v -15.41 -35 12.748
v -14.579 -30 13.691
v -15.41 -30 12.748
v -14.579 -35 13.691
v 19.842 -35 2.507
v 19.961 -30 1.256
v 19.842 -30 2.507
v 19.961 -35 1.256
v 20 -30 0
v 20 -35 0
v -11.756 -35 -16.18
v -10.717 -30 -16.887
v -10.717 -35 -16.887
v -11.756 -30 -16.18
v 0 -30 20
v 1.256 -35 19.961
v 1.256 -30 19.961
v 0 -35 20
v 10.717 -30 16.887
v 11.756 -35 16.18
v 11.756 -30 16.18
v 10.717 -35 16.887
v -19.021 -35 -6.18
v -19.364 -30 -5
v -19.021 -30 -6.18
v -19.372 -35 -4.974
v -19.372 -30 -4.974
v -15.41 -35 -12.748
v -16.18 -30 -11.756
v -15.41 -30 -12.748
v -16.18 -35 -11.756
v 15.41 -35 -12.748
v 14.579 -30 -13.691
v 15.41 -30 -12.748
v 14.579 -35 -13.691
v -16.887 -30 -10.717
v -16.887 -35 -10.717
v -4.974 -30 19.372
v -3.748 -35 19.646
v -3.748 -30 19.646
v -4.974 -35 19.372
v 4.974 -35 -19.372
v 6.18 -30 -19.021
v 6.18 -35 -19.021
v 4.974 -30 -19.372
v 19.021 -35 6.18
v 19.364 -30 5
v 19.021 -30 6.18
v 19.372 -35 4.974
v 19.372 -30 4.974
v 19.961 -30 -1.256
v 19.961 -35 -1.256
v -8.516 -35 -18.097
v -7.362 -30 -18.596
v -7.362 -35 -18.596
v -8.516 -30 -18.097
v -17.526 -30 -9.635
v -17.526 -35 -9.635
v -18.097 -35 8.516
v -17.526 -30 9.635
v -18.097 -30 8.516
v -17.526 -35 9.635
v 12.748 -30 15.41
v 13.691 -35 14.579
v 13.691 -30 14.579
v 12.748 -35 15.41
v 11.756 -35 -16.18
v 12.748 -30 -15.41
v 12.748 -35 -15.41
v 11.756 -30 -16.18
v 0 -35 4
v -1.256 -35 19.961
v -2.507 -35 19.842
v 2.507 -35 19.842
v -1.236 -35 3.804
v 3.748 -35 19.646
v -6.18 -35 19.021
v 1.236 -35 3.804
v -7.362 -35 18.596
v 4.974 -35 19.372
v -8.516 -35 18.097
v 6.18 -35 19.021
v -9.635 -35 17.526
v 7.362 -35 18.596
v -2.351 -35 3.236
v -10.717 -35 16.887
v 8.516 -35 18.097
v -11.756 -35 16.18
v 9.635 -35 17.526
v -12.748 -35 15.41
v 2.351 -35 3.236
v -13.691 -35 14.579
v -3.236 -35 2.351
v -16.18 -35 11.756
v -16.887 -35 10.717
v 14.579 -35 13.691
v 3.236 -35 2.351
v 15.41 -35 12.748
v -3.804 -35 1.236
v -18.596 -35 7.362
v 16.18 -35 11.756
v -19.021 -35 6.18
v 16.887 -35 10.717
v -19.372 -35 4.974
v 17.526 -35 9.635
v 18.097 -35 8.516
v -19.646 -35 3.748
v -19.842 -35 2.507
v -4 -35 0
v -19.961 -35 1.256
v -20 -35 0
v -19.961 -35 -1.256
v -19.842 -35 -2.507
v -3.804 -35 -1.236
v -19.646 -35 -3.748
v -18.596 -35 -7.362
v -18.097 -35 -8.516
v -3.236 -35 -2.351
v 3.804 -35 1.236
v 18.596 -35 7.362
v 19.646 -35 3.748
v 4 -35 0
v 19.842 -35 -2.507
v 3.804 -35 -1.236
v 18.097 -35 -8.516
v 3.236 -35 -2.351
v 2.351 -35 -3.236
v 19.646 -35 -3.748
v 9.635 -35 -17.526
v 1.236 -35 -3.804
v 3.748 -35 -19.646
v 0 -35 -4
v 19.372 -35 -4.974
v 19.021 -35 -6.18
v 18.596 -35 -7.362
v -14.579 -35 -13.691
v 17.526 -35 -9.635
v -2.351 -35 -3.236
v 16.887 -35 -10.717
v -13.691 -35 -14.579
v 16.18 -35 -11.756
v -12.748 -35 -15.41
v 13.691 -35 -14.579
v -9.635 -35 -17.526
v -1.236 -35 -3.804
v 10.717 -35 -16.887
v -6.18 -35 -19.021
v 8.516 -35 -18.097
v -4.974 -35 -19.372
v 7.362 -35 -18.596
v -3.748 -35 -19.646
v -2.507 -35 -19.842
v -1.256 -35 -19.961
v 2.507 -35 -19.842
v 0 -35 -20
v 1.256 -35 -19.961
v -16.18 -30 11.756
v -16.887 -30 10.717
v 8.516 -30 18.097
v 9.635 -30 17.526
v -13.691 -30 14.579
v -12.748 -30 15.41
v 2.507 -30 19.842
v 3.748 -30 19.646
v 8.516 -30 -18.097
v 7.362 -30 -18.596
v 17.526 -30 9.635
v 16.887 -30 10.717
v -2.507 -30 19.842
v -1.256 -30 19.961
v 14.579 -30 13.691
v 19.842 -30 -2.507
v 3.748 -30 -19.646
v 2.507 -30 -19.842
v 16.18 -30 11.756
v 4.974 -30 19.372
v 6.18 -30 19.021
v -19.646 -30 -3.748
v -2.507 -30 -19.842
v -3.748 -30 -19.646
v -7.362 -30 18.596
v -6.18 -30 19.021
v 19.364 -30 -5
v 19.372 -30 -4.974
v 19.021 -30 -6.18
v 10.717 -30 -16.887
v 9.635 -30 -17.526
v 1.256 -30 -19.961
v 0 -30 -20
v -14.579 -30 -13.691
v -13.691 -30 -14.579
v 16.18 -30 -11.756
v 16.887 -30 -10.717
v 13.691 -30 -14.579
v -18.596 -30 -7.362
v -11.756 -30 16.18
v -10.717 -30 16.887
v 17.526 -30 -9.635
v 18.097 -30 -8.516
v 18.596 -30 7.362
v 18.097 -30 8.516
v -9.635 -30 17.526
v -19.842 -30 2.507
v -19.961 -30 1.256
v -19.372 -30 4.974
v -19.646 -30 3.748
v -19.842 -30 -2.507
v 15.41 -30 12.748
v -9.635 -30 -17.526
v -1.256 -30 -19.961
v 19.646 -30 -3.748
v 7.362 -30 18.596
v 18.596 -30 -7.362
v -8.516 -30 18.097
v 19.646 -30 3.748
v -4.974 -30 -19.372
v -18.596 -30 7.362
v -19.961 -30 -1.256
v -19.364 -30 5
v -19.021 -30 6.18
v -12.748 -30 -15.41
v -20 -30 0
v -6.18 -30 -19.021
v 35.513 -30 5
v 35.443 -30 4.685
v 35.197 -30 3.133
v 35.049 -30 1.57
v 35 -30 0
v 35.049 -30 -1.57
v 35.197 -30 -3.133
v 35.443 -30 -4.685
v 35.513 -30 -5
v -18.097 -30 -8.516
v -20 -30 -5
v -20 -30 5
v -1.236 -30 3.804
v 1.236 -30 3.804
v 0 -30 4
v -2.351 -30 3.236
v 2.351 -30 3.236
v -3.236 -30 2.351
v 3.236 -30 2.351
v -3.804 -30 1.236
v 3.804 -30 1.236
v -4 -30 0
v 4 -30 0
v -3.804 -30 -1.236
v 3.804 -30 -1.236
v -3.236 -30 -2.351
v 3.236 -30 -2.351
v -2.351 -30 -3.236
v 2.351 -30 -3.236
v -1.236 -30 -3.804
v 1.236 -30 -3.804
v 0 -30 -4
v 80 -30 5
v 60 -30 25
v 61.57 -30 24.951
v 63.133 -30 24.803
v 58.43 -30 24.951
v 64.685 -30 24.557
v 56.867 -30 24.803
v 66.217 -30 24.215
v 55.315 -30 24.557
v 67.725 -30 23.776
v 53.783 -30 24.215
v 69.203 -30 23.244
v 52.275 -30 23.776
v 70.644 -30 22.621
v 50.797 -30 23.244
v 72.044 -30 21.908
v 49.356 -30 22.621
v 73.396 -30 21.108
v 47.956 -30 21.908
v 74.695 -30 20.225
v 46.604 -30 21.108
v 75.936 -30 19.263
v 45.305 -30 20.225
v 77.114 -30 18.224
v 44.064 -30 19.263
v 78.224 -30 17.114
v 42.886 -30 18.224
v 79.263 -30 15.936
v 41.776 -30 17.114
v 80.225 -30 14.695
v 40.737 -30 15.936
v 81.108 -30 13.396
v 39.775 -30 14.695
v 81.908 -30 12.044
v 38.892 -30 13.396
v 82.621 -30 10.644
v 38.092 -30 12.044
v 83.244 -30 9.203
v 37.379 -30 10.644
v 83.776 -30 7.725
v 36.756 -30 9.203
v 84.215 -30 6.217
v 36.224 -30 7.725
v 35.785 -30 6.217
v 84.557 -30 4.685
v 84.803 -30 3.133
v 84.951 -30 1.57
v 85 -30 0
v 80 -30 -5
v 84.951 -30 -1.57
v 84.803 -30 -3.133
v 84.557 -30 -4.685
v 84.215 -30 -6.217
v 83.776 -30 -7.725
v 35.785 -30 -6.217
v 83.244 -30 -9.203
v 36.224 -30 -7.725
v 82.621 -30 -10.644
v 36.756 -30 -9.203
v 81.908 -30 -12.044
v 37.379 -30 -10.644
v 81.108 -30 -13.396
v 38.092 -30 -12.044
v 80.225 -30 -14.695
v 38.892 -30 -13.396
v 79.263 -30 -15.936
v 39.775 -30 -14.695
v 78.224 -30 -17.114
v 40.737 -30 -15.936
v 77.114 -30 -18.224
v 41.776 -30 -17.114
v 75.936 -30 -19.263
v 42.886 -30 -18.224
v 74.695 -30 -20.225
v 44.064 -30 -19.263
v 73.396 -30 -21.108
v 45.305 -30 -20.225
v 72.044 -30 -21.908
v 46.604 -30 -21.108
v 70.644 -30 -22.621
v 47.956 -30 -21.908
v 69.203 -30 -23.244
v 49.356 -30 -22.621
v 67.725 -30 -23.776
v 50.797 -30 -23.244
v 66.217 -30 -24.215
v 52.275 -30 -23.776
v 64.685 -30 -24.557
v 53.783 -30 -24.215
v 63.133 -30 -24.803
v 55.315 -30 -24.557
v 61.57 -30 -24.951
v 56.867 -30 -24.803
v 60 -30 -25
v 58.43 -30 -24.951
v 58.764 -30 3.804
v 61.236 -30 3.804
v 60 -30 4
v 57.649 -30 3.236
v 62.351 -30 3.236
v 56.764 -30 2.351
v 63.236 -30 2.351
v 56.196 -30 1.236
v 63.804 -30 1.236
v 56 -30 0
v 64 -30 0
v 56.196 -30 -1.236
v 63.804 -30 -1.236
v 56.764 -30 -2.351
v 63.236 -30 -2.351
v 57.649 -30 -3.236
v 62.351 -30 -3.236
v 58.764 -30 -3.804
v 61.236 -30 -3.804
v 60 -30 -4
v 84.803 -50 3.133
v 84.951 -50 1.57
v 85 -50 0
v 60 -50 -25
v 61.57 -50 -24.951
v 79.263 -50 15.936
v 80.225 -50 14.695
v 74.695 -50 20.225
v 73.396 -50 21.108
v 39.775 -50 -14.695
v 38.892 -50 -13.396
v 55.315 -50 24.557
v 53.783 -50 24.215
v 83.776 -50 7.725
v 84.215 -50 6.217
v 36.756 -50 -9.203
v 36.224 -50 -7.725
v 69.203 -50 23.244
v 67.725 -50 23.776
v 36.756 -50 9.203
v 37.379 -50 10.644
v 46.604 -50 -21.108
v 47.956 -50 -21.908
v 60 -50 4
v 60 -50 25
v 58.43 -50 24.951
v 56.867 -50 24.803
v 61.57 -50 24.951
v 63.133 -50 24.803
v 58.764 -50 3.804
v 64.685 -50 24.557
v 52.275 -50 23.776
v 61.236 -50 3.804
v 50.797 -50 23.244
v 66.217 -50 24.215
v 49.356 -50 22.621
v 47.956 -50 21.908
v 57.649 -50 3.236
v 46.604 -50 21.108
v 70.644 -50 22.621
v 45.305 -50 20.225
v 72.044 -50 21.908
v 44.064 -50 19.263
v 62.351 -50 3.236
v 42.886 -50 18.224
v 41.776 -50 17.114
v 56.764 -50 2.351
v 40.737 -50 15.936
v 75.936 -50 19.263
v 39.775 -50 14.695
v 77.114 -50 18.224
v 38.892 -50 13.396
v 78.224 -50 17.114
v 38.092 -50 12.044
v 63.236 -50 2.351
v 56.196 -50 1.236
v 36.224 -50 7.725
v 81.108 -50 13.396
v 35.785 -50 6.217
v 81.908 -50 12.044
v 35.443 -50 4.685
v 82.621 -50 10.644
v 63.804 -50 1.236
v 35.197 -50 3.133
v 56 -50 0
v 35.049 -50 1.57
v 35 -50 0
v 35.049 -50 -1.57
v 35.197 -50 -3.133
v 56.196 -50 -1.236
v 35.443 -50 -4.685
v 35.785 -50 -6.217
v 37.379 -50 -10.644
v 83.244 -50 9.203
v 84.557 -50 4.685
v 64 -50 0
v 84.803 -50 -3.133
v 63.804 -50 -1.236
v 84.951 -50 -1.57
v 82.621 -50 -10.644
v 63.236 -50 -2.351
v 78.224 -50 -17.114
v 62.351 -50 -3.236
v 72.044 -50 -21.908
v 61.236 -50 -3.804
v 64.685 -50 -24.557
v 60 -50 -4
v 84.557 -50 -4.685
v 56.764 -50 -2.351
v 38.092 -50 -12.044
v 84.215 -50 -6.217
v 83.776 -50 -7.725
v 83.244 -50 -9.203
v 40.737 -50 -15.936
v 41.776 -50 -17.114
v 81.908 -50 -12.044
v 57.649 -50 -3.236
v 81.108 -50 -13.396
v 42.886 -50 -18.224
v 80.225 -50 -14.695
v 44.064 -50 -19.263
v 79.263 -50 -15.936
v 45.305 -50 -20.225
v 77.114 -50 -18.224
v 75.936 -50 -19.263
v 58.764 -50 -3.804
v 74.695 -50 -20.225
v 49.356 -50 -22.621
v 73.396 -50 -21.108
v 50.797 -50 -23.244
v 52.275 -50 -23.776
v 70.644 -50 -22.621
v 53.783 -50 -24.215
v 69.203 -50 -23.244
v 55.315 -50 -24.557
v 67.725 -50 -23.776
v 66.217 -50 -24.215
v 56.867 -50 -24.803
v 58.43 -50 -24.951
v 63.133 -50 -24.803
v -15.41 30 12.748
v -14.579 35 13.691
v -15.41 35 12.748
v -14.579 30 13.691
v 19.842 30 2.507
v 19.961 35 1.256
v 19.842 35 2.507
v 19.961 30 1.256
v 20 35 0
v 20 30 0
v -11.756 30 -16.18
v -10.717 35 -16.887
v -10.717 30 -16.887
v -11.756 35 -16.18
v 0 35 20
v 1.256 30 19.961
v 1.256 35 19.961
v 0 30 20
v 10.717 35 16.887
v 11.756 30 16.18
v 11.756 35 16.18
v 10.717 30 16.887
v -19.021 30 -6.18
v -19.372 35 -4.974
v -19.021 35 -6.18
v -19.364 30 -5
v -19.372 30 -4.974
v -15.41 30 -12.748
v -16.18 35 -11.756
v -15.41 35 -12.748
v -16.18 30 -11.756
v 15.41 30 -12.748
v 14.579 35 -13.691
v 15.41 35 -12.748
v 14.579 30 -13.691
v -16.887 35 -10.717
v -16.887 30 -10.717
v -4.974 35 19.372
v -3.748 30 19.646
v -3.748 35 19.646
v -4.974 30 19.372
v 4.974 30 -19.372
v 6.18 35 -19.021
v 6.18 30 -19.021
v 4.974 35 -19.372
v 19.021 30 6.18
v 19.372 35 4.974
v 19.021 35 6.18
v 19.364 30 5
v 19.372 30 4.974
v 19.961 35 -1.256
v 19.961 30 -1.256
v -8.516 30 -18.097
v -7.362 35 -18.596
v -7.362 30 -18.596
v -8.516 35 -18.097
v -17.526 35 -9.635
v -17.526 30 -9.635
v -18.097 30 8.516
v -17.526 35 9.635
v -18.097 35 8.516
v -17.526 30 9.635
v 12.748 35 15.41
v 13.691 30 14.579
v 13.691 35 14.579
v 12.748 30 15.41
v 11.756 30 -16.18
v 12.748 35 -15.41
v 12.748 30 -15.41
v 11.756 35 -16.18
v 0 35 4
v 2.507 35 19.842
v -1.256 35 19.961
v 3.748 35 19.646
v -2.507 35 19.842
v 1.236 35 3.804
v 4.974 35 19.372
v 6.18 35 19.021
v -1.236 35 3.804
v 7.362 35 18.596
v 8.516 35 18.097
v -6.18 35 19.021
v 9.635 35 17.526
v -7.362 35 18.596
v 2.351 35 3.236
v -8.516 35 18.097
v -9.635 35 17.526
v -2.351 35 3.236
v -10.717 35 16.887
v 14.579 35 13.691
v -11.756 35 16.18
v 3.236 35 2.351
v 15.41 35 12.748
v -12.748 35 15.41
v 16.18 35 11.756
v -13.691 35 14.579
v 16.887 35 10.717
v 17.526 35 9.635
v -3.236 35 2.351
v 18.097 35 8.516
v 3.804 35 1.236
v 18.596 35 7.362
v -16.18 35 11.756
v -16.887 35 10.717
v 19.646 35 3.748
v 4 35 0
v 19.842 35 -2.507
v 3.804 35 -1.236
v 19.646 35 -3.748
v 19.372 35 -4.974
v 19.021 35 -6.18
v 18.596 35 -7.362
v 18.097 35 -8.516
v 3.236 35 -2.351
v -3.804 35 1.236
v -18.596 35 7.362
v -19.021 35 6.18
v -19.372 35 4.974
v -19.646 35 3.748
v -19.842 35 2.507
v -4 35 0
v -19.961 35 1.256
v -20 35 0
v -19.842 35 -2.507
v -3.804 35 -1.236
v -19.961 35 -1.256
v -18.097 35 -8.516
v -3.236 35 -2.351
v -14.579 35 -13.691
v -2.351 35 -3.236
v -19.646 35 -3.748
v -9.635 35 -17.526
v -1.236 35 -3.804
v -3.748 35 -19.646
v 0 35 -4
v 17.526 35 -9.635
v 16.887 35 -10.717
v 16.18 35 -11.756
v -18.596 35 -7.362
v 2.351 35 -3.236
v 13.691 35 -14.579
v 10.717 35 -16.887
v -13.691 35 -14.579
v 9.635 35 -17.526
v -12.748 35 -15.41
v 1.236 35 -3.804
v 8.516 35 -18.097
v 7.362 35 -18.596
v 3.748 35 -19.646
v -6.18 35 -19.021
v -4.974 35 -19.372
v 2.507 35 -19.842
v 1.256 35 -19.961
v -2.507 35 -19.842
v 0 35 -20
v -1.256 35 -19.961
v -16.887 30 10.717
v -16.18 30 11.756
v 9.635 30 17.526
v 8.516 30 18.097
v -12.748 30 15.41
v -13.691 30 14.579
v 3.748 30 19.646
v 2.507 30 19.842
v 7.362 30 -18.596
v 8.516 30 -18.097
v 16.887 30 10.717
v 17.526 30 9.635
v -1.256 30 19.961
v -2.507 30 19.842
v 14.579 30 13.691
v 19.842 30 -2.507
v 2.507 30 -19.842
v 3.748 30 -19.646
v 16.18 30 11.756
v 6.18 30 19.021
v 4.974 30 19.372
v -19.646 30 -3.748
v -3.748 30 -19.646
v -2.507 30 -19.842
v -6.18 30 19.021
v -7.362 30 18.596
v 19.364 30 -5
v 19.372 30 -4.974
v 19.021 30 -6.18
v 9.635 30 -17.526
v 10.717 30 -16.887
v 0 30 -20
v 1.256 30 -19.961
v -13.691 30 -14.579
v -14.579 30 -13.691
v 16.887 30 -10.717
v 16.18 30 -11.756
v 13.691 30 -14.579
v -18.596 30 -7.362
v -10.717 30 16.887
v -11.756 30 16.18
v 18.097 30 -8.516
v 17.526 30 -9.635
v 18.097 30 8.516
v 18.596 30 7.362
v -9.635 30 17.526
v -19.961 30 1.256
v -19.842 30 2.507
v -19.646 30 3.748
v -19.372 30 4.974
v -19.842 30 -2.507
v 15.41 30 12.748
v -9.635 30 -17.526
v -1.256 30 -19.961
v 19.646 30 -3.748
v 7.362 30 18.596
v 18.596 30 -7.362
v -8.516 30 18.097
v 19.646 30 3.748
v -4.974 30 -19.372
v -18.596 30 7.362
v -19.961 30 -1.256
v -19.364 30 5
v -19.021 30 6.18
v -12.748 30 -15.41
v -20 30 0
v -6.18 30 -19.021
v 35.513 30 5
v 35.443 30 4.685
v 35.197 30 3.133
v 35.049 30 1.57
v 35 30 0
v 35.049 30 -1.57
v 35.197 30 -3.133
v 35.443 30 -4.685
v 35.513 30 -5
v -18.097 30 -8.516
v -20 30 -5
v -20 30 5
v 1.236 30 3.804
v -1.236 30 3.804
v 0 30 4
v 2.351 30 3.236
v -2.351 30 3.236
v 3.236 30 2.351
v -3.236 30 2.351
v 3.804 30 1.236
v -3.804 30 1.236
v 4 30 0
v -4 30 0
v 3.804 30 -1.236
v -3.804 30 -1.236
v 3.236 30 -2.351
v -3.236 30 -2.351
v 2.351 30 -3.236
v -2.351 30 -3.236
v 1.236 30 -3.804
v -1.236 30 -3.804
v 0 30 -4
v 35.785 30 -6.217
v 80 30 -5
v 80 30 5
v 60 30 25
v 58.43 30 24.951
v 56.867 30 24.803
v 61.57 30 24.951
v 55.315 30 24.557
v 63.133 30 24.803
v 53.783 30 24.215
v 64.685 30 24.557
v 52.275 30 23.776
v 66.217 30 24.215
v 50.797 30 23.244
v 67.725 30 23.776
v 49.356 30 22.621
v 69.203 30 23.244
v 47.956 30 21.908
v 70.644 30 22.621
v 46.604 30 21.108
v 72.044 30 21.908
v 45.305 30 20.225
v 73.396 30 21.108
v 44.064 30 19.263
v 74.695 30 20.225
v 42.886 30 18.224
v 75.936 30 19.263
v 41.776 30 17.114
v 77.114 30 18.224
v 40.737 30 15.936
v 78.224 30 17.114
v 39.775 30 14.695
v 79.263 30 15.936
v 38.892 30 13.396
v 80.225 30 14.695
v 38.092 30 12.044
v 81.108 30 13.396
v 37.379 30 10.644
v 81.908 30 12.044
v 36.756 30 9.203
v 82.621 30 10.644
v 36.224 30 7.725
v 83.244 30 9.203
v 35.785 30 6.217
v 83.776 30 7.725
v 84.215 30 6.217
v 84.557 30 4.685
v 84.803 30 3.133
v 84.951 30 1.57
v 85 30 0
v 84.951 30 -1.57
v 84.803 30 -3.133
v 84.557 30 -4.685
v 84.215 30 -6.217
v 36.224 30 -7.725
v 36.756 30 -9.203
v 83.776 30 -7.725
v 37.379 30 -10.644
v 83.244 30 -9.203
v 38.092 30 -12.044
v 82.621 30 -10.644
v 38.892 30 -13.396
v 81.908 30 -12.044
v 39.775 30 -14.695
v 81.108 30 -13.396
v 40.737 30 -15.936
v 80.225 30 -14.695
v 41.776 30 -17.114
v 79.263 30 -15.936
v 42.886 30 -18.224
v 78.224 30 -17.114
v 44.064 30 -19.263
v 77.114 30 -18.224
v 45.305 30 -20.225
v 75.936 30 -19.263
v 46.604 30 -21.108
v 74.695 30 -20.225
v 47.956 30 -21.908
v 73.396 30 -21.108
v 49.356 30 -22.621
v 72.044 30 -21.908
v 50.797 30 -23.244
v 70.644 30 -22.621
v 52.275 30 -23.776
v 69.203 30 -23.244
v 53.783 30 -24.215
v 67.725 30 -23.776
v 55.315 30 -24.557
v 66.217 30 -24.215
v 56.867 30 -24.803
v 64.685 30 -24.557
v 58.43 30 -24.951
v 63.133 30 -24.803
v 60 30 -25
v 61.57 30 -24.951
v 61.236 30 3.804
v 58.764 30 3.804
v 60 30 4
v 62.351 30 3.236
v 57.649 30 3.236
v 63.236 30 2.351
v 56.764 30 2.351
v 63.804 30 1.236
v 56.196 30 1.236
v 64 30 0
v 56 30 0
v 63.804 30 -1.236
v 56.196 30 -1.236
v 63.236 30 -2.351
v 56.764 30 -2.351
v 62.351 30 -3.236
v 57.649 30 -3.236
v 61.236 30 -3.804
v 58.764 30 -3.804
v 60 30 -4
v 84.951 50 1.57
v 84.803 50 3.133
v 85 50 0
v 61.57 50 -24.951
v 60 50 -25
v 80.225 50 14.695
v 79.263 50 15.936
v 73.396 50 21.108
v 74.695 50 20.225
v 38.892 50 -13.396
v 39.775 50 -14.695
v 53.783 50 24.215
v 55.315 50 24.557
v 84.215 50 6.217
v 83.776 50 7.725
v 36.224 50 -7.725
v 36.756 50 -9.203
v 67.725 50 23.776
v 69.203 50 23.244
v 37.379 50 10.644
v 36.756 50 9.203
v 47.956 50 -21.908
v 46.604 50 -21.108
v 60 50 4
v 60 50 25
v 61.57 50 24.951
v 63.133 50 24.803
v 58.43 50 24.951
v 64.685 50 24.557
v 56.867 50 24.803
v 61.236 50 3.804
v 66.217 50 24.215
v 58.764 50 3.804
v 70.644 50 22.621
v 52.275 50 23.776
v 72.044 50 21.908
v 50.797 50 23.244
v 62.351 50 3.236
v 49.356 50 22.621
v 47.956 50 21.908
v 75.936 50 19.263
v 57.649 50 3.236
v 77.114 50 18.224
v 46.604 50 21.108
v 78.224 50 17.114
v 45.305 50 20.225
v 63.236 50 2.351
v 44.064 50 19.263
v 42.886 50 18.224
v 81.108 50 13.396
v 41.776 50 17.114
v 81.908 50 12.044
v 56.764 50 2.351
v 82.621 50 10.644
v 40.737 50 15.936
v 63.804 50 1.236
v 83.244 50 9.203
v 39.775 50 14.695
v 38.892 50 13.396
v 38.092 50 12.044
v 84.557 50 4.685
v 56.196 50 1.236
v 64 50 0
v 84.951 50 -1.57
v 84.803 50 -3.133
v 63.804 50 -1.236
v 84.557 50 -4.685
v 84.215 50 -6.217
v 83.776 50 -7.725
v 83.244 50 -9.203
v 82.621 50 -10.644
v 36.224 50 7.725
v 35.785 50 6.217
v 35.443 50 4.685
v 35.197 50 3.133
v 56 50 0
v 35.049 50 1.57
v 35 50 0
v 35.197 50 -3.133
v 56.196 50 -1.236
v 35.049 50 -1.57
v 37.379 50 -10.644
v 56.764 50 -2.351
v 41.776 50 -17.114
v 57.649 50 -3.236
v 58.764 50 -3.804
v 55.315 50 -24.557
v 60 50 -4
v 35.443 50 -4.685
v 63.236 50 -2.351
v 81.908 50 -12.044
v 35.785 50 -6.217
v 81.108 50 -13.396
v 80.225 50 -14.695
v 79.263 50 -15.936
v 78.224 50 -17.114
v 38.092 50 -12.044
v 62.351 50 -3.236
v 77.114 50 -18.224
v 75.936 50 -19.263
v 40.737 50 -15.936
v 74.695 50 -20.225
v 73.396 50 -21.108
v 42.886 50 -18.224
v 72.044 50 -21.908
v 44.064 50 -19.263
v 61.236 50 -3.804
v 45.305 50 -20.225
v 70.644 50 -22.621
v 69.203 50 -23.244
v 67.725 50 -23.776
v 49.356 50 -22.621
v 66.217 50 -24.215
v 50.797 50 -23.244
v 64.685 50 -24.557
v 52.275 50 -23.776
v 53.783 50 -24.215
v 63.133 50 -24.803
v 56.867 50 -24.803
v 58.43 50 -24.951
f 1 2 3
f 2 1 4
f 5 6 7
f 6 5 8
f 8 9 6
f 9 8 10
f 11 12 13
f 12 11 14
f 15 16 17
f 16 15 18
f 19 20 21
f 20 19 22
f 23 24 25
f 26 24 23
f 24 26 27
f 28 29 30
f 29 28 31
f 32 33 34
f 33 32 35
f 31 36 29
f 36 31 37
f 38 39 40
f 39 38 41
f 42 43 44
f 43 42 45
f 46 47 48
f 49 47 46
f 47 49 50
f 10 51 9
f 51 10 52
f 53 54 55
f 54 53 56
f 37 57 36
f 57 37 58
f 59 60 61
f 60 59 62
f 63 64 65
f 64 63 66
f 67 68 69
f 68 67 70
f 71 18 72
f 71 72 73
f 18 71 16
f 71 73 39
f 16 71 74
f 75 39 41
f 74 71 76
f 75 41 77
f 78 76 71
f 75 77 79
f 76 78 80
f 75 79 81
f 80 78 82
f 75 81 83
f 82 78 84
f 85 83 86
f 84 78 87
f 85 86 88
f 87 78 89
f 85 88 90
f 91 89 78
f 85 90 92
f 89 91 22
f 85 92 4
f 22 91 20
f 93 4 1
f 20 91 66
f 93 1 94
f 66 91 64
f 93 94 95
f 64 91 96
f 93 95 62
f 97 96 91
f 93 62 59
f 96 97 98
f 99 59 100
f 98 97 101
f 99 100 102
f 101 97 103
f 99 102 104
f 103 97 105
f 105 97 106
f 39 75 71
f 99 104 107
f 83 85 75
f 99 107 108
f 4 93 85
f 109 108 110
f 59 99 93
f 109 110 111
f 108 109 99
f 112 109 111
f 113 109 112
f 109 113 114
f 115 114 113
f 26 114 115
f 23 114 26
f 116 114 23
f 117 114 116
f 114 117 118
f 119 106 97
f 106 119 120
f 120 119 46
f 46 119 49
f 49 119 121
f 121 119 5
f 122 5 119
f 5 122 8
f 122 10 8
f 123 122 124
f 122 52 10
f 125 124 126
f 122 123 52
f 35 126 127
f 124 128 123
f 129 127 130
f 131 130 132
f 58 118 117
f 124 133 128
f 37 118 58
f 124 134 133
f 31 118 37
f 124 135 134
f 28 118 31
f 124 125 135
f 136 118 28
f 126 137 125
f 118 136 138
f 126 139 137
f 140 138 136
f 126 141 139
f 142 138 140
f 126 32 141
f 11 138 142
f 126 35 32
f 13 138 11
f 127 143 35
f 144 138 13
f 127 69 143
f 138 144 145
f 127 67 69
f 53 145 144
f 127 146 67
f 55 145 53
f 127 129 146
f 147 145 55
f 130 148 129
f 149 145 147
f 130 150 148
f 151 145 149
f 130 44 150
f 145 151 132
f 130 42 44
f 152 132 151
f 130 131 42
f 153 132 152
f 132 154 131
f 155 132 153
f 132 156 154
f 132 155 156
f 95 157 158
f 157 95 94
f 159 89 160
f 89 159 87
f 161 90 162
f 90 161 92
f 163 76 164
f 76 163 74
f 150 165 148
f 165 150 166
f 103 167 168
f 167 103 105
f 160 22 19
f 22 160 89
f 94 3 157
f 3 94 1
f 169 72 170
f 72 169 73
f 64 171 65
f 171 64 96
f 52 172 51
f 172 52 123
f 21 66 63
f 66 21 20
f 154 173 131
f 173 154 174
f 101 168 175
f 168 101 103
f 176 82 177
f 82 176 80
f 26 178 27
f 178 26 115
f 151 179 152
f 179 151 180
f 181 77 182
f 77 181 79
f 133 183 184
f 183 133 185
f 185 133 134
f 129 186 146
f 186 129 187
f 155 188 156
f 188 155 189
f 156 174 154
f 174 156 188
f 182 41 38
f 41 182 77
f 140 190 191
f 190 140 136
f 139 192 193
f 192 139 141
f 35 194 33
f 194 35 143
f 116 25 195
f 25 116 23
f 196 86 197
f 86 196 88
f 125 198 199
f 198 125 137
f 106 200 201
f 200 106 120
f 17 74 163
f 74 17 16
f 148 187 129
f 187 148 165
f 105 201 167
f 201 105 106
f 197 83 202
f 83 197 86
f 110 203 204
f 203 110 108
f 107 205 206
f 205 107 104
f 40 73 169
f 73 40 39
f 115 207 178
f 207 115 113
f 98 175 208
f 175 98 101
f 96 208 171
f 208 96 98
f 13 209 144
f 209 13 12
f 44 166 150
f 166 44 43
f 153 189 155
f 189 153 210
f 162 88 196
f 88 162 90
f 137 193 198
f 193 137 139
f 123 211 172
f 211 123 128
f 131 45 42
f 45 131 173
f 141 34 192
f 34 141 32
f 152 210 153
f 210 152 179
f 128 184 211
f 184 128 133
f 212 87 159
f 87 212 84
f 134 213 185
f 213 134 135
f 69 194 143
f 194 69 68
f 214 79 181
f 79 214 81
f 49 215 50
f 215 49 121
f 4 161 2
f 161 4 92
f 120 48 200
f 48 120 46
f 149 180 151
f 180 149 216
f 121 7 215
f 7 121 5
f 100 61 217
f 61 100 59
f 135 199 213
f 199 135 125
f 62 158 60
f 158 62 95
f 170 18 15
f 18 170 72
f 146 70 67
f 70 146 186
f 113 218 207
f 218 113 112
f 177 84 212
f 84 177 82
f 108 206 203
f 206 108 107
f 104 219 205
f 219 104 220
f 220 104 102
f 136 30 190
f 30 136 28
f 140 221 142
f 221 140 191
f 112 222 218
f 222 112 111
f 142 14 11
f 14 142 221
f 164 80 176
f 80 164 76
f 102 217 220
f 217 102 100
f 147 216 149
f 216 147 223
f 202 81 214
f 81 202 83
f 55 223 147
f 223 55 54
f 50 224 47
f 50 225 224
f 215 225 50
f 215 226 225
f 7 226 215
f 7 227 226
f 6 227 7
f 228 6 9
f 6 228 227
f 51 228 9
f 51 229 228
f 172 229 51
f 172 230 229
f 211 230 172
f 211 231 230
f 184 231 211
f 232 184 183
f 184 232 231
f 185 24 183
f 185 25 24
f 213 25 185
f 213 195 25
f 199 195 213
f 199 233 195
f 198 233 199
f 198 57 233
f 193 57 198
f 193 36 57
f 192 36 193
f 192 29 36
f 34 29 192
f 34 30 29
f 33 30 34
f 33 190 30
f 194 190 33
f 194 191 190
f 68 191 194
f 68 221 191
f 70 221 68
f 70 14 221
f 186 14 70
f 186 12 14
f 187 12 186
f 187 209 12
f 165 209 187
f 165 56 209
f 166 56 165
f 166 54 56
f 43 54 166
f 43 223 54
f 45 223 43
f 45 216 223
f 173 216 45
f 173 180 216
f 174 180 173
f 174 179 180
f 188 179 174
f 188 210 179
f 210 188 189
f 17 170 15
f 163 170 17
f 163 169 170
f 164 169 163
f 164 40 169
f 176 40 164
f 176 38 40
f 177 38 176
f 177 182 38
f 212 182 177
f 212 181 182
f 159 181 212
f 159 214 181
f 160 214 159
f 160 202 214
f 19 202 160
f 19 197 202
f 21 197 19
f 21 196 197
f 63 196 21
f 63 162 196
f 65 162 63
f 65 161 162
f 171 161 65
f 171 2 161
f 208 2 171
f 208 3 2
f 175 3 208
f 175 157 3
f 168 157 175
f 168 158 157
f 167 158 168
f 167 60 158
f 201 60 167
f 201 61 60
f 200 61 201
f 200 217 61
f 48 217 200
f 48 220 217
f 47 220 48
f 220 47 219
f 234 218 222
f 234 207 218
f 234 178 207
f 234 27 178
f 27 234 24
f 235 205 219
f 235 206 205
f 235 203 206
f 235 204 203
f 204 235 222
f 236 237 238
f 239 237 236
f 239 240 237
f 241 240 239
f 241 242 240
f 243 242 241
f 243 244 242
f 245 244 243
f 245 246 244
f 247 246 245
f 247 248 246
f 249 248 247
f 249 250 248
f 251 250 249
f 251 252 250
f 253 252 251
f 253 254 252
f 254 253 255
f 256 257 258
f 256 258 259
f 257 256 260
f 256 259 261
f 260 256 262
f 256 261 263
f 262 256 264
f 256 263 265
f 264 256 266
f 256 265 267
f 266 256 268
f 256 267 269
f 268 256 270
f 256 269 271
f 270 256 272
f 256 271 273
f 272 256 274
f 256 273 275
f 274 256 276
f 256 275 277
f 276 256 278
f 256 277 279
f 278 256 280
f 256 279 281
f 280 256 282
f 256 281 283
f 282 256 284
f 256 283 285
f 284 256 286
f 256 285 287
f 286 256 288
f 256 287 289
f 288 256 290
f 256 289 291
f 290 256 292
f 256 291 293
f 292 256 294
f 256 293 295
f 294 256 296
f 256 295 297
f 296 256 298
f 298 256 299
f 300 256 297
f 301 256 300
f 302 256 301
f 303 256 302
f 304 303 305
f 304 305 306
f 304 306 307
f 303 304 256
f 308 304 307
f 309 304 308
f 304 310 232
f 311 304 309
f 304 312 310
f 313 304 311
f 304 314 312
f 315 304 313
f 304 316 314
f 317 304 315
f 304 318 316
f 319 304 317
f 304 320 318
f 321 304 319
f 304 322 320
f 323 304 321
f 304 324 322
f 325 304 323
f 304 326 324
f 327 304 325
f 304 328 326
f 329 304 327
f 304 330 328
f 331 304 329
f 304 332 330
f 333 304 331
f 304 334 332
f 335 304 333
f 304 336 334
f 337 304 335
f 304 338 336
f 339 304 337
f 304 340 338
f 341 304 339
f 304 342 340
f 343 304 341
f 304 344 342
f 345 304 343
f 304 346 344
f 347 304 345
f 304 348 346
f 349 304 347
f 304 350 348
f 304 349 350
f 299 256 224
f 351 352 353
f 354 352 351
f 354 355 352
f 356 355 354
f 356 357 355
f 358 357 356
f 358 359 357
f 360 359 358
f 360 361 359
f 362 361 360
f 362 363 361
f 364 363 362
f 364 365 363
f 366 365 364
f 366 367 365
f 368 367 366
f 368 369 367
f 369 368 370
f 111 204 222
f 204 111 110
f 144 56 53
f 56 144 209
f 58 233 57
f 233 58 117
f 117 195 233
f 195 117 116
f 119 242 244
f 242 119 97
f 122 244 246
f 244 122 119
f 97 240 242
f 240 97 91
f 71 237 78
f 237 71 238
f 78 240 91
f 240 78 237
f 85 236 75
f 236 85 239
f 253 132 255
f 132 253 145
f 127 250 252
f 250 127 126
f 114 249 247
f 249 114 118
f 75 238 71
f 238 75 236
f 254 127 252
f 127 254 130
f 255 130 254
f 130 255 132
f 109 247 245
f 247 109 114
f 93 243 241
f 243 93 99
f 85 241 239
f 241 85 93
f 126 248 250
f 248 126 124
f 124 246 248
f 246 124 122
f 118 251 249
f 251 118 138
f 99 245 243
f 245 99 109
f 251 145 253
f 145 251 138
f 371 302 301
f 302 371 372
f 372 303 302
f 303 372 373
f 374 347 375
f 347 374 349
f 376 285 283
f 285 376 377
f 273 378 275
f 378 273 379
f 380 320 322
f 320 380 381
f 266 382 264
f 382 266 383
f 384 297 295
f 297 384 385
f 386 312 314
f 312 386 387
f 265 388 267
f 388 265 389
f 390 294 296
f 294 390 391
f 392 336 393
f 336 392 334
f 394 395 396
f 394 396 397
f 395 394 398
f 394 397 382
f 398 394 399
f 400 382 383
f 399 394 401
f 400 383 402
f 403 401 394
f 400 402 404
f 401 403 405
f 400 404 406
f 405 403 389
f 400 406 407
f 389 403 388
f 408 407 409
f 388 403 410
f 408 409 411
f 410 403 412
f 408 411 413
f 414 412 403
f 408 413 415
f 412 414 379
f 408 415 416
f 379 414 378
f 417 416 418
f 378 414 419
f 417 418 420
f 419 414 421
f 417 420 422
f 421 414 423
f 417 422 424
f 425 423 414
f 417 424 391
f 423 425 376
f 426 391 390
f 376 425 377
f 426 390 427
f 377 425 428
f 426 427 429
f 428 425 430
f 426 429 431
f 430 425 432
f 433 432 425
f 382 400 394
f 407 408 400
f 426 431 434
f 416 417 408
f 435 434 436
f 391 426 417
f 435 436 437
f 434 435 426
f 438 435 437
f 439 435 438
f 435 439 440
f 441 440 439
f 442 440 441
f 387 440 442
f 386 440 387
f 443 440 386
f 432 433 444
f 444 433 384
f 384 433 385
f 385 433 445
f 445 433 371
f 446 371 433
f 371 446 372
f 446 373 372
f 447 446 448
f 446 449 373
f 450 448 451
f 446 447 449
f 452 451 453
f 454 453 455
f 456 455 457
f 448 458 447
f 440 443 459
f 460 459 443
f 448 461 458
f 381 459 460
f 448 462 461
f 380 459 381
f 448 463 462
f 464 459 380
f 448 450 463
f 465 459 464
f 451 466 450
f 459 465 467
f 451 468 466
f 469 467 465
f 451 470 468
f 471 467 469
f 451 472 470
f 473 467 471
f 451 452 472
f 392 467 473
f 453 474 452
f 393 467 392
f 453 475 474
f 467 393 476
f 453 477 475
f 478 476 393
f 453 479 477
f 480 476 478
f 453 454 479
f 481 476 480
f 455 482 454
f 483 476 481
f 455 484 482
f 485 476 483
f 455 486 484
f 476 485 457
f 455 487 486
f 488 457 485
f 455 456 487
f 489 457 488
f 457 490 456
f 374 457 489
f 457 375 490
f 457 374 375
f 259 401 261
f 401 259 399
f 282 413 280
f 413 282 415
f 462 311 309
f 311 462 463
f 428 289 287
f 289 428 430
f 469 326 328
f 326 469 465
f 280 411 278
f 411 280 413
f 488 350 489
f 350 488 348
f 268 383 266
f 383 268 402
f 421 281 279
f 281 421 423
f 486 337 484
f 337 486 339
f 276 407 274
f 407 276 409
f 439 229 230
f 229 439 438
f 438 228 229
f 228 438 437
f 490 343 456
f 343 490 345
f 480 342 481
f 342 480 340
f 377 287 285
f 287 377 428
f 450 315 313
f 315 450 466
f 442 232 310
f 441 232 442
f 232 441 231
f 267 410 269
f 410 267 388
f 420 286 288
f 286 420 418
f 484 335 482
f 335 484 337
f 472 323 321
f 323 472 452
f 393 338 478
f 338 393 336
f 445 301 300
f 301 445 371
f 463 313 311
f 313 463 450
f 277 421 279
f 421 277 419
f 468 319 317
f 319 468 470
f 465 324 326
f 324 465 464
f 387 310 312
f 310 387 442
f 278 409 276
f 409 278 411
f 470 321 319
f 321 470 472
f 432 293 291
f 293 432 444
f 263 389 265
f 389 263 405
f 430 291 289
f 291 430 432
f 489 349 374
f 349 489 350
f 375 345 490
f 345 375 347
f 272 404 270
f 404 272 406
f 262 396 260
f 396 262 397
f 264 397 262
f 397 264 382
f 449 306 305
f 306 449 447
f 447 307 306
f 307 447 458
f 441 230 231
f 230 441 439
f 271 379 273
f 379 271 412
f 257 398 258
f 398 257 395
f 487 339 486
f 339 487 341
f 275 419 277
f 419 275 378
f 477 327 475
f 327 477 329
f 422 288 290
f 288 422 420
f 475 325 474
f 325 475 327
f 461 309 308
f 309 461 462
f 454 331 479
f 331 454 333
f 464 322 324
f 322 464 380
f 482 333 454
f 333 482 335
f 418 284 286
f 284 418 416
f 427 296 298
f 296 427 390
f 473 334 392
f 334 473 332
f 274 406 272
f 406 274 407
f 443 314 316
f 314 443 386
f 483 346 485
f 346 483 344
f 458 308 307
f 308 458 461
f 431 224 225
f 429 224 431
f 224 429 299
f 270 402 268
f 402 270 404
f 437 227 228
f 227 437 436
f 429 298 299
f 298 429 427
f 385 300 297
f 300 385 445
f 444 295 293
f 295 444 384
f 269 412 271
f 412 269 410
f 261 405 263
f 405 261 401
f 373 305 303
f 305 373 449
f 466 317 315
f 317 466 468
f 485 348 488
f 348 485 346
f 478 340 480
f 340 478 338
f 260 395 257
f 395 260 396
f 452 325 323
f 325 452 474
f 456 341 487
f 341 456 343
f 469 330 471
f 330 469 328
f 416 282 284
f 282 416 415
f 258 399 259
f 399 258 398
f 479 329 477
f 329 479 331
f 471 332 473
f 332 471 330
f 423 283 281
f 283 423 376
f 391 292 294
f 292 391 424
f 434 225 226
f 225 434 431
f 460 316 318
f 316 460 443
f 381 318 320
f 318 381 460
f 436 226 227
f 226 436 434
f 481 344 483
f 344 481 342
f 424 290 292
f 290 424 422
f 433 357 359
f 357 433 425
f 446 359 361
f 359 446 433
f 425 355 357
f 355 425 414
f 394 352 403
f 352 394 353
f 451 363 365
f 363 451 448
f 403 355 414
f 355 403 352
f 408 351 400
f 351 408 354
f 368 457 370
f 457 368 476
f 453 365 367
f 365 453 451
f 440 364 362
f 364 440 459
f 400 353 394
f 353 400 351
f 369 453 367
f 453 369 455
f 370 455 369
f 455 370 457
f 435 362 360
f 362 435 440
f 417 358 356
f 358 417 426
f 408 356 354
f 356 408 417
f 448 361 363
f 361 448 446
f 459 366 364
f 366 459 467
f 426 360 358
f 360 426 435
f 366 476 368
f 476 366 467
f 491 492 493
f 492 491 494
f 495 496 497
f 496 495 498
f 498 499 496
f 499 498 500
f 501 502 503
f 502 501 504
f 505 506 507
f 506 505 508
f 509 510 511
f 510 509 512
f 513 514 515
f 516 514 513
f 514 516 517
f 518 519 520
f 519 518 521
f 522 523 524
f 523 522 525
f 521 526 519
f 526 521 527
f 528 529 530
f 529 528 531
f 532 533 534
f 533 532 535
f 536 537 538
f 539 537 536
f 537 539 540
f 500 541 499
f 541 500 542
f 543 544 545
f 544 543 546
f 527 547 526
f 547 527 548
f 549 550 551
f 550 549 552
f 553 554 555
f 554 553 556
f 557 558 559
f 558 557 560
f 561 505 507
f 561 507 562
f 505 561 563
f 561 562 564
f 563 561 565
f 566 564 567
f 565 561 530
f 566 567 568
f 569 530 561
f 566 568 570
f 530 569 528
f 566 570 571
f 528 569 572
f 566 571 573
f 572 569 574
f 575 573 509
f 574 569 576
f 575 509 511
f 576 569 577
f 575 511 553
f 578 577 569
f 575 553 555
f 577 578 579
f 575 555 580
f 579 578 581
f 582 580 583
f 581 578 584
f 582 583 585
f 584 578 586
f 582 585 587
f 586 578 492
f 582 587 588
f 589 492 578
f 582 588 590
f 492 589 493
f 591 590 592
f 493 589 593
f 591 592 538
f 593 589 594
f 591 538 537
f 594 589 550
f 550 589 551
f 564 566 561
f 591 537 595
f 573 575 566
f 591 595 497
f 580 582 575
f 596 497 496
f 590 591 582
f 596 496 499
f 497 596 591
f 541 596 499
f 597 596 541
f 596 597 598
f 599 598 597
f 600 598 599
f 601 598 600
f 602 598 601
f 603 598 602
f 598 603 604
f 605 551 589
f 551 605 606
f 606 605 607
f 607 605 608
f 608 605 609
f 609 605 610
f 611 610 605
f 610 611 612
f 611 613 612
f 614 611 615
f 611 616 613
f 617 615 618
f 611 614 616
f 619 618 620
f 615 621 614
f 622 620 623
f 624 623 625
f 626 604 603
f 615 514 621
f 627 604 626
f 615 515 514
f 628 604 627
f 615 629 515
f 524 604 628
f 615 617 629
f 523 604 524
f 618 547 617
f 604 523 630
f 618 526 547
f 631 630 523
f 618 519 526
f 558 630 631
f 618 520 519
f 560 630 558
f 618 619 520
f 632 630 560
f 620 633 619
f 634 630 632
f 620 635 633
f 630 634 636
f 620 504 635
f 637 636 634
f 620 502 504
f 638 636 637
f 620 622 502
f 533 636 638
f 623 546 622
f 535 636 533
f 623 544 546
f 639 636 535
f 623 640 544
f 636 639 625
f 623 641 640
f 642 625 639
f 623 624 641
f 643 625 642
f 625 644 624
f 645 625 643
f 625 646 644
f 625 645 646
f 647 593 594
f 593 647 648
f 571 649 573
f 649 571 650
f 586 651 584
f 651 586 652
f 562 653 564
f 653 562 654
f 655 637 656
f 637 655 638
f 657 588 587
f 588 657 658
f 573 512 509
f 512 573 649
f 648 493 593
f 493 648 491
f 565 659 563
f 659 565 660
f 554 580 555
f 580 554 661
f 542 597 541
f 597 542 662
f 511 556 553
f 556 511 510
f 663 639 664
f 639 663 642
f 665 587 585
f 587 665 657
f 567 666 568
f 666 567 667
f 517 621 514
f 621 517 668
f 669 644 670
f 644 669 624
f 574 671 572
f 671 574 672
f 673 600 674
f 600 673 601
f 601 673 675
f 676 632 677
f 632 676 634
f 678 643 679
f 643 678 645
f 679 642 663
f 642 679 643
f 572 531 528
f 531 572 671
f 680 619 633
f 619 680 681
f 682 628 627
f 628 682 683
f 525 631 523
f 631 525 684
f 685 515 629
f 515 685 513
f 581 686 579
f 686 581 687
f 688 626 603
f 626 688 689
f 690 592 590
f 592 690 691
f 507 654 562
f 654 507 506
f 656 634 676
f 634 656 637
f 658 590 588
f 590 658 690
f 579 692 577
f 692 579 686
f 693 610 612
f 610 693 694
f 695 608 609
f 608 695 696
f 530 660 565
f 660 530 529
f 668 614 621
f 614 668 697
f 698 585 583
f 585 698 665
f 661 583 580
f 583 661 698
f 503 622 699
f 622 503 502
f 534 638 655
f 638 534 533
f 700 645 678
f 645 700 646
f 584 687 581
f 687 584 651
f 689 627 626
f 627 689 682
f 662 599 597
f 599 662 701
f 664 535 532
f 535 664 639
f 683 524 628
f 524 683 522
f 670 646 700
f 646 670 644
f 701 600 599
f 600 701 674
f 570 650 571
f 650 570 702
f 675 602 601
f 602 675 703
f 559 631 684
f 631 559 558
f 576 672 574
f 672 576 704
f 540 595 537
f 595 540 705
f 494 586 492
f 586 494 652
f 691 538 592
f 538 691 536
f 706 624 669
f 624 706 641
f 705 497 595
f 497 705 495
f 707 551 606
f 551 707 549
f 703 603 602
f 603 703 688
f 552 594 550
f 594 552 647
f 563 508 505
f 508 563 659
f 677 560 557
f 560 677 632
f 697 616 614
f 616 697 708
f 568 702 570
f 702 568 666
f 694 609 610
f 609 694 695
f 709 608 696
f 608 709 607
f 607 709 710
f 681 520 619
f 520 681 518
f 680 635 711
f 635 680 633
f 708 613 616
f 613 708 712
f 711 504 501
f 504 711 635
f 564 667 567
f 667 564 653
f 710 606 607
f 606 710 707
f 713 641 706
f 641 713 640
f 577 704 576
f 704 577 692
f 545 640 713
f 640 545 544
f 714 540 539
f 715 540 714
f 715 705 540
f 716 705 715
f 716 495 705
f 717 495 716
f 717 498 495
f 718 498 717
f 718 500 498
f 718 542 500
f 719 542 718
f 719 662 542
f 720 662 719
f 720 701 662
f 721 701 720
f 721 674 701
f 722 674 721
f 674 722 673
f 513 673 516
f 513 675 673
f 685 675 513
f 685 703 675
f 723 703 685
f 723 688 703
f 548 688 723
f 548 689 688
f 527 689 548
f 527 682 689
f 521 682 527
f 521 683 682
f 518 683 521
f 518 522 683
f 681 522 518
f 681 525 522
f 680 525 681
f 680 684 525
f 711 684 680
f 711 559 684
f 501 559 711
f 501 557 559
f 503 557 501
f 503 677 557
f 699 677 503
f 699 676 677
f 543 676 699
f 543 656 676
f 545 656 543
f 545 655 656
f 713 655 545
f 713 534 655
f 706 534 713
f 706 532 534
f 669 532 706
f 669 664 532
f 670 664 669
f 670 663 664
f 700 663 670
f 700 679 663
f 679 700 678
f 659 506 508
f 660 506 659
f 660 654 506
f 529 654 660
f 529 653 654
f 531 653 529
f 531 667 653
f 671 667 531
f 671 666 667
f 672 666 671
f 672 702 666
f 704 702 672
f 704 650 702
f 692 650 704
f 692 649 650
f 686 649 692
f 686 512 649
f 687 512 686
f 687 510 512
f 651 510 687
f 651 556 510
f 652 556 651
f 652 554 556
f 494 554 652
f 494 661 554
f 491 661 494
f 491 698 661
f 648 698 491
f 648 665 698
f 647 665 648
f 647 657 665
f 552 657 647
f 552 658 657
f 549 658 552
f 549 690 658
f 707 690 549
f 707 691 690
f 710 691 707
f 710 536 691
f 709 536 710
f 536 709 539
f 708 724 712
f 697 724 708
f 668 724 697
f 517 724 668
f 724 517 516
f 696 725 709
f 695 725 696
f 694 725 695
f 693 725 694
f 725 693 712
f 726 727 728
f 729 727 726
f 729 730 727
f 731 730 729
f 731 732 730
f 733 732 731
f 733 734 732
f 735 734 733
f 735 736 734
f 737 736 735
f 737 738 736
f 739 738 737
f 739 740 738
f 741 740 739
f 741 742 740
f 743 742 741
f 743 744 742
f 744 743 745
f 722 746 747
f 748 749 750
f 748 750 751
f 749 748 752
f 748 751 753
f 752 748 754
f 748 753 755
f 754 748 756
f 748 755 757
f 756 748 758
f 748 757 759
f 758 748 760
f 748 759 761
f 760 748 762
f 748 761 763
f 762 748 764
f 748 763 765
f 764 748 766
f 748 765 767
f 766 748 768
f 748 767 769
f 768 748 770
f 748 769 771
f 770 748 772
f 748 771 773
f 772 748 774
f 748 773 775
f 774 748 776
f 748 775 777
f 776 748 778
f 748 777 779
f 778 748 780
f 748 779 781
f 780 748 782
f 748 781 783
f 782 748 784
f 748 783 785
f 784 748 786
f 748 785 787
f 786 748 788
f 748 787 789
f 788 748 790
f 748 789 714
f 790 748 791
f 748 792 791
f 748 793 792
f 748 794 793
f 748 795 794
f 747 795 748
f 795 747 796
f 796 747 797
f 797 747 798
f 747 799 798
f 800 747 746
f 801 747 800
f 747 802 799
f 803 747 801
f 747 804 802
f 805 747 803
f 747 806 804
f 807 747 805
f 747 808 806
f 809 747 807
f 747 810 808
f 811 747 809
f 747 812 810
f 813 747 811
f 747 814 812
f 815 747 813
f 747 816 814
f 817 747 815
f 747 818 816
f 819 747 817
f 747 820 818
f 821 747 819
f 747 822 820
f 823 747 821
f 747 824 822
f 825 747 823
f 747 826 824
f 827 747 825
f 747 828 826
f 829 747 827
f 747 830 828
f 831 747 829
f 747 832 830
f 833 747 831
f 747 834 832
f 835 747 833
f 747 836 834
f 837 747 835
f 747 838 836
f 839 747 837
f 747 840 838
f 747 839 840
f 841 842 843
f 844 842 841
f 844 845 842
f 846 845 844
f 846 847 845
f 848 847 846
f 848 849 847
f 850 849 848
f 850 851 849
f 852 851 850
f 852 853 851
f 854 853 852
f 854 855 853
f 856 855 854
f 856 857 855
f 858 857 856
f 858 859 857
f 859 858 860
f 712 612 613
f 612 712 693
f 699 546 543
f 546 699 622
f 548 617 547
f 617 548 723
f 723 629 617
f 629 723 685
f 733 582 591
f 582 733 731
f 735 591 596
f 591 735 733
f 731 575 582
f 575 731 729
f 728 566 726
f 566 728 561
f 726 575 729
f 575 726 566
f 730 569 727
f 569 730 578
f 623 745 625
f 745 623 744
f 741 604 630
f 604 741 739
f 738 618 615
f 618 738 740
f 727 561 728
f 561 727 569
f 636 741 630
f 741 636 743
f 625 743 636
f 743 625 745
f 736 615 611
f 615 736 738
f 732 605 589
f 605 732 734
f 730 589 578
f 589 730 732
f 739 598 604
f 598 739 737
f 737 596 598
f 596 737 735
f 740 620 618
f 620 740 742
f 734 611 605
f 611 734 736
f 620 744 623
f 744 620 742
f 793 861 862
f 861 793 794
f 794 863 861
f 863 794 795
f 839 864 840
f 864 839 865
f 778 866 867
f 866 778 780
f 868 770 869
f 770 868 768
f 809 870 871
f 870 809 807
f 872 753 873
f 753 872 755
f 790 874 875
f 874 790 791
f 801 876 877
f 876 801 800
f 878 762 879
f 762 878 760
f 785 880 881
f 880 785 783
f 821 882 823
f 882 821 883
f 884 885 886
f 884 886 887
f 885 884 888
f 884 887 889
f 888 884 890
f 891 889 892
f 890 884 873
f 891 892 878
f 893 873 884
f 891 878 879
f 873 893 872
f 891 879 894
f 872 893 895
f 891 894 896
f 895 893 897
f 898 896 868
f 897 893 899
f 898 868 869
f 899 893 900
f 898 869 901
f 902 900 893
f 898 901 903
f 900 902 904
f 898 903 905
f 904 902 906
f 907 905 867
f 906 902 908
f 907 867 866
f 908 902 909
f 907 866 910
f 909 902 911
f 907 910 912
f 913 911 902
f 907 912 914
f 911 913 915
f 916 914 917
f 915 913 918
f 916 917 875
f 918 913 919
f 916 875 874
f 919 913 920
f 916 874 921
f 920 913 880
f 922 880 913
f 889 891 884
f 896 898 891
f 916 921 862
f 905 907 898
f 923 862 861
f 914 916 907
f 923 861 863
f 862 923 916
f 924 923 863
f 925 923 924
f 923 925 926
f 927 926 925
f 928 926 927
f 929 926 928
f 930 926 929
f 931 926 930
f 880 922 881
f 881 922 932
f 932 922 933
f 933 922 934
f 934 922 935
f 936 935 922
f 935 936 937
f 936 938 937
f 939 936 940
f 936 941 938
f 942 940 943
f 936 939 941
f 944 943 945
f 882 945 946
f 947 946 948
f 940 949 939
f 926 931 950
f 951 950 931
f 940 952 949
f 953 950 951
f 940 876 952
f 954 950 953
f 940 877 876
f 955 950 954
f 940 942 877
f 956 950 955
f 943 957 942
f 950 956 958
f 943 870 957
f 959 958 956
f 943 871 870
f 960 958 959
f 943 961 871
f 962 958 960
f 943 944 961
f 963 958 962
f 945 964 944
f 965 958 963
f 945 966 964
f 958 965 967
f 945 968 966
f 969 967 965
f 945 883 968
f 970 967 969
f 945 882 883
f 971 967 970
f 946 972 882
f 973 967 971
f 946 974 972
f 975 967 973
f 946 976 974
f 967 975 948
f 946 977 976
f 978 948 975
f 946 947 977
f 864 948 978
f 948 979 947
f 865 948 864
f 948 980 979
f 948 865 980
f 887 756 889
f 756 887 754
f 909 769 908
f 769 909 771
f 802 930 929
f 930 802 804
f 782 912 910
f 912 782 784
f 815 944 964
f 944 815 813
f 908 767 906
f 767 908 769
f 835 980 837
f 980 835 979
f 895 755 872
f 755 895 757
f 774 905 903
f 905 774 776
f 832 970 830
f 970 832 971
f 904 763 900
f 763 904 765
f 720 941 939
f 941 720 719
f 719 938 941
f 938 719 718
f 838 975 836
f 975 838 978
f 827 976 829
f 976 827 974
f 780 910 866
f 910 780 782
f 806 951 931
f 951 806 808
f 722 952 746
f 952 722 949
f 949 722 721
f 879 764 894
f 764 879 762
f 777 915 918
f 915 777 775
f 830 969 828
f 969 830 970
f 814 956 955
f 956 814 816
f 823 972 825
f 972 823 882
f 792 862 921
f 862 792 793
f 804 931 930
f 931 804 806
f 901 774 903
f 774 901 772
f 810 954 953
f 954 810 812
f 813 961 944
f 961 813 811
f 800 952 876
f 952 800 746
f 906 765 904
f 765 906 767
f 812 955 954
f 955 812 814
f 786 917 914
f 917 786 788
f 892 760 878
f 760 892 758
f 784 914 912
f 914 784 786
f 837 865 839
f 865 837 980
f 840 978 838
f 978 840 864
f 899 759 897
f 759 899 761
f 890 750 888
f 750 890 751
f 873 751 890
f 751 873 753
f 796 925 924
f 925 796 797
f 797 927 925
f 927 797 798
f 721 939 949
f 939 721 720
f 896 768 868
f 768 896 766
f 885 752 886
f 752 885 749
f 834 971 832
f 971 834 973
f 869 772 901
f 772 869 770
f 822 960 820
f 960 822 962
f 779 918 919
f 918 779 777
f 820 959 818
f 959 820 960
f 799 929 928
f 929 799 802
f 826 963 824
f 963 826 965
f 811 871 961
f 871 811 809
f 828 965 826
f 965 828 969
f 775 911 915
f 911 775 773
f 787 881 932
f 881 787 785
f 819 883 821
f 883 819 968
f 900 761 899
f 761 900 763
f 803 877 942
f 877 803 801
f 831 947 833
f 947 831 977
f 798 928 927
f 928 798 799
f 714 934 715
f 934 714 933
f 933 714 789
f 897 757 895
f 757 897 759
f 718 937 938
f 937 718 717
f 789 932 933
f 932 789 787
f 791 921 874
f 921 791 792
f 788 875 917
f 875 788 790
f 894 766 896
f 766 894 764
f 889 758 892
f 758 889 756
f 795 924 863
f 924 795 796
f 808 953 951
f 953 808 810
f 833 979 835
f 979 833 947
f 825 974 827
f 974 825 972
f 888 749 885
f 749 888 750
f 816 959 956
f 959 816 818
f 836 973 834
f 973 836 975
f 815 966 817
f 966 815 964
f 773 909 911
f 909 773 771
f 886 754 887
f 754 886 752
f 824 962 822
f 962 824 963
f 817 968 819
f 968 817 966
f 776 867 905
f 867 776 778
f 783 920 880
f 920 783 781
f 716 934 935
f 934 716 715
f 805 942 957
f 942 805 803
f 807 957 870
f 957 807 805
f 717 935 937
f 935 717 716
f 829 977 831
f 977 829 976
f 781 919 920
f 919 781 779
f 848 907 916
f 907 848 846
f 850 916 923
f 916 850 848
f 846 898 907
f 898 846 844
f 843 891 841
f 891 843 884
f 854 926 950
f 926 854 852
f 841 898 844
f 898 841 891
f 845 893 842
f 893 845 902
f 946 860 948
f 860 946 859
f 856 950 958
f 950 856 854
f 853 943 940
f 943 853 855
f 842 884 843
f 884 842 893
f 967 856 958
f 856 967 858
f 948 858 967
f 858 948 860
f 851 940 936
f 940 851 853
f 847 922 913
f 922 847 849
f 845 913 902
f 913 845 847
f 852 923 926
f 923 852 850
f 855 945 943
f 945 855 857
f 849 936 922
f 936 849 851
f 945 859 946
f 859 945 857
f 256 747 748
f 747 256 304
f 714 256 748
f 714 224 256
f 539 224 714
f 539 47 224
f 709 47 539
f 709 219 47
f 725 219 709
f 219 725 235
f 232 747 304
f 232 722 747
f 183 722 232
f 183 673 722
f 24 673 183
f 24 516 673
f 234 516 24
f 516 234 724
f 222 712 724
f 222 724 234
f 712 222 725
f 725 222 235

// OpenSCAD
// file: rueda_simple.scad
use <./utils/build_plate.scad> // Cuadricula transparente para la base
build_plate(3, 200,100); // No se incluye al renderizar


module rueda_simple(grosor=5, diametro=40, diam_eje=8)
{
  //-- Construcción de la rueda a partir de
  //-- los parámetros
  difference() {
    //-- Base de la rueda
    cylinder(r=diametro/2, h=grosor,$fn=100);

    //-- Taladro del eje
    cylinder(r=diam_eje/2, h=3*grosor,$fn=20,center=true);
  }
}

//-- Ejemplos de uso del modulo
//-- Rueda por defecto
rueda_simple();

translate([-50,0,0])
  rueda_simple(grosor=20);

translate([50,0,0])
  rueda_simple(grosor=20, diametro=20);
// file: utils/build_plate.scad
// Build Plate representation module
// Made by Makerbot (http://curriculum.makerbot.com/daily_lessons/february/openscad_buildplate.html)

//use this to include a build plate visualization in your openSCAD scripts. Very useful for things designed to be edited in Makerbot Customizer

//to use, either include or use <utils/build_plate.scad>

//then just call build_plate(); with the following arguments (also, you have to have a real object in your scene for this to render)

//putting 0 as the first argument will give you a Replicator 2 build plate
//putting 1 as the first argument will give you a Replicator 1 build plate
//putting 2 as the first argument will give you a Thingomatic build plate
//putting 3 as the first argument will give you a manually adjustable build plate (note: if you use this option, you need to specify your build plates X length (in mm) as the second argument and the Y length (in mm) as the third argument. eg. build_plate(3,150,120);)

/*

to give your user control of which build plate they see in Customizer, include the following code:

use <utils/build_plate.scad>

//for display only, doesn't contribute to final object
build_plate_selector = 0; //[0:Replicator 2,1: Replicator,2:Thingomatic,3:Manual]
//when Build Plate Selector is set to "manual" this controls the build plate x dimension
build_plate_manual_x = 100; //[100:400]
//when Build Plate Selector is set to "manual" this controls the build plate y dimension
build_plate_manual_y = 100; //[100:400]

build_plate(build_plate_selector,build_plate_manual_x,build_plate_manual_y);

*/




//to see how this works, uncomment the following code

//build_plate_selector = 0; //[0:Replicator 2,1: Replicator,2:Thingomatic,3:Manual]
//build_plate_manual_x = 100; //[100:400]
//build_plate_manual_y = 100; //[100:400]
//
//build_plate(build_plate_selector,build_plate_manual_x,build_plate_manual_y);
//
//cube(5);


module build_plate(bp,manX,manY){

		translate([0,0,-.52]){
			if(bp == 0){
				%cube([285,153,1],center = true);
			}
			if(bp == 1){
				%cube([225,145,1],center = true);
			}
			if(bp == 2){
				%cube([120,120,1],center = true);
			}
			if(bp == 3){
				%cube([manX,manY,1],center = true);
			}
		
		}
		translate([0,0,-.5]){
			if(bp == 0){
				for(i = [-14:14]){
					translate([i*10,0,0])
					%cube([.5,153,1.01],center = true);
				}
				for(i = [-7:7]){
					translate([0,i*10,0])
					%cube([285,.5,1.01],center = true);
				}	
			}
			if(bp == 1){
				for(i = [-11:11]){
					translate([i*10,0,0])
						%cube([.5,145,1.01],center = true);
				}
				for(i = [-7:7]){
					translate([0,i*10,0])
						%cube([225,.5,1.01],center = true);
				}
			}
			if(bp == 2){
				for(i = [-6:6]){
					translate([i*10,0,0])
						%cube([.5,120,1.01],center = true);
				}
				for(i = [-6:6]){
					translate([0,i*10,0])
						%cube([120,.5,1.01],center = true);
				}
			}
			if(bp == 3){
				for(i = [-(floor(manX/20)):floor(manX/20)]){
					translate([i*10,0,0])
						%cube([.5,manY,1.01],center = true);
				}
				for(i = [-(floor(manY/20)):floor(manY/20)]){
					translate([0,i*10,0])
						%cube([manX,.5,1.01],center = true);
				}
			}
		}
}
// main file
use <./utils/build_plate.scad> // Cuadricula transparente para la base
build_plate(3, 200,100); // No se incluye al renderizar


//----------------------------------------------------------
//-- Tutorial OpenScad
//-- Juan Gonzalez-Gomez (Obijuan) juan@iearobotics.com
//----------------------------------------------------------
//-- (c) Mayo, 2012
//-- Licencia GPL
//----------------------------------------------------------
//-- Ejemplo sencillo de como utilizar los modulos
//-- Construccion de un coche simple
//----------------------------------------------------------

use <rueda_simple.scad>

//-- Chasis del cohe
translate([30,0,0])
cube([100,60,10],center=true);

//-- Rueda delantera izquierda
translate([0,-30,0])
  rotate([90,0,0])
    rueda_simple();

//-- Rueda trasera izquierda
translate([60,-30,0])
  rotate([90,0,0])
    rueda_simple(grosor=20, diametro=50);

//-- Lado derecho del coche. Es simetrico con respecto
//-- al izquierdo
mirror([0,1,0]) {
  //-- Rueda delantera derecha
  translate([0,-30,0])
    rotate([90,0,0])
      rueda_simple();

  //-- Rueda trasera derecha
  translate([60,-30,0])
    rotate([90,0,0])
      rueda_simple(grosor=20, diametro=50);
}
